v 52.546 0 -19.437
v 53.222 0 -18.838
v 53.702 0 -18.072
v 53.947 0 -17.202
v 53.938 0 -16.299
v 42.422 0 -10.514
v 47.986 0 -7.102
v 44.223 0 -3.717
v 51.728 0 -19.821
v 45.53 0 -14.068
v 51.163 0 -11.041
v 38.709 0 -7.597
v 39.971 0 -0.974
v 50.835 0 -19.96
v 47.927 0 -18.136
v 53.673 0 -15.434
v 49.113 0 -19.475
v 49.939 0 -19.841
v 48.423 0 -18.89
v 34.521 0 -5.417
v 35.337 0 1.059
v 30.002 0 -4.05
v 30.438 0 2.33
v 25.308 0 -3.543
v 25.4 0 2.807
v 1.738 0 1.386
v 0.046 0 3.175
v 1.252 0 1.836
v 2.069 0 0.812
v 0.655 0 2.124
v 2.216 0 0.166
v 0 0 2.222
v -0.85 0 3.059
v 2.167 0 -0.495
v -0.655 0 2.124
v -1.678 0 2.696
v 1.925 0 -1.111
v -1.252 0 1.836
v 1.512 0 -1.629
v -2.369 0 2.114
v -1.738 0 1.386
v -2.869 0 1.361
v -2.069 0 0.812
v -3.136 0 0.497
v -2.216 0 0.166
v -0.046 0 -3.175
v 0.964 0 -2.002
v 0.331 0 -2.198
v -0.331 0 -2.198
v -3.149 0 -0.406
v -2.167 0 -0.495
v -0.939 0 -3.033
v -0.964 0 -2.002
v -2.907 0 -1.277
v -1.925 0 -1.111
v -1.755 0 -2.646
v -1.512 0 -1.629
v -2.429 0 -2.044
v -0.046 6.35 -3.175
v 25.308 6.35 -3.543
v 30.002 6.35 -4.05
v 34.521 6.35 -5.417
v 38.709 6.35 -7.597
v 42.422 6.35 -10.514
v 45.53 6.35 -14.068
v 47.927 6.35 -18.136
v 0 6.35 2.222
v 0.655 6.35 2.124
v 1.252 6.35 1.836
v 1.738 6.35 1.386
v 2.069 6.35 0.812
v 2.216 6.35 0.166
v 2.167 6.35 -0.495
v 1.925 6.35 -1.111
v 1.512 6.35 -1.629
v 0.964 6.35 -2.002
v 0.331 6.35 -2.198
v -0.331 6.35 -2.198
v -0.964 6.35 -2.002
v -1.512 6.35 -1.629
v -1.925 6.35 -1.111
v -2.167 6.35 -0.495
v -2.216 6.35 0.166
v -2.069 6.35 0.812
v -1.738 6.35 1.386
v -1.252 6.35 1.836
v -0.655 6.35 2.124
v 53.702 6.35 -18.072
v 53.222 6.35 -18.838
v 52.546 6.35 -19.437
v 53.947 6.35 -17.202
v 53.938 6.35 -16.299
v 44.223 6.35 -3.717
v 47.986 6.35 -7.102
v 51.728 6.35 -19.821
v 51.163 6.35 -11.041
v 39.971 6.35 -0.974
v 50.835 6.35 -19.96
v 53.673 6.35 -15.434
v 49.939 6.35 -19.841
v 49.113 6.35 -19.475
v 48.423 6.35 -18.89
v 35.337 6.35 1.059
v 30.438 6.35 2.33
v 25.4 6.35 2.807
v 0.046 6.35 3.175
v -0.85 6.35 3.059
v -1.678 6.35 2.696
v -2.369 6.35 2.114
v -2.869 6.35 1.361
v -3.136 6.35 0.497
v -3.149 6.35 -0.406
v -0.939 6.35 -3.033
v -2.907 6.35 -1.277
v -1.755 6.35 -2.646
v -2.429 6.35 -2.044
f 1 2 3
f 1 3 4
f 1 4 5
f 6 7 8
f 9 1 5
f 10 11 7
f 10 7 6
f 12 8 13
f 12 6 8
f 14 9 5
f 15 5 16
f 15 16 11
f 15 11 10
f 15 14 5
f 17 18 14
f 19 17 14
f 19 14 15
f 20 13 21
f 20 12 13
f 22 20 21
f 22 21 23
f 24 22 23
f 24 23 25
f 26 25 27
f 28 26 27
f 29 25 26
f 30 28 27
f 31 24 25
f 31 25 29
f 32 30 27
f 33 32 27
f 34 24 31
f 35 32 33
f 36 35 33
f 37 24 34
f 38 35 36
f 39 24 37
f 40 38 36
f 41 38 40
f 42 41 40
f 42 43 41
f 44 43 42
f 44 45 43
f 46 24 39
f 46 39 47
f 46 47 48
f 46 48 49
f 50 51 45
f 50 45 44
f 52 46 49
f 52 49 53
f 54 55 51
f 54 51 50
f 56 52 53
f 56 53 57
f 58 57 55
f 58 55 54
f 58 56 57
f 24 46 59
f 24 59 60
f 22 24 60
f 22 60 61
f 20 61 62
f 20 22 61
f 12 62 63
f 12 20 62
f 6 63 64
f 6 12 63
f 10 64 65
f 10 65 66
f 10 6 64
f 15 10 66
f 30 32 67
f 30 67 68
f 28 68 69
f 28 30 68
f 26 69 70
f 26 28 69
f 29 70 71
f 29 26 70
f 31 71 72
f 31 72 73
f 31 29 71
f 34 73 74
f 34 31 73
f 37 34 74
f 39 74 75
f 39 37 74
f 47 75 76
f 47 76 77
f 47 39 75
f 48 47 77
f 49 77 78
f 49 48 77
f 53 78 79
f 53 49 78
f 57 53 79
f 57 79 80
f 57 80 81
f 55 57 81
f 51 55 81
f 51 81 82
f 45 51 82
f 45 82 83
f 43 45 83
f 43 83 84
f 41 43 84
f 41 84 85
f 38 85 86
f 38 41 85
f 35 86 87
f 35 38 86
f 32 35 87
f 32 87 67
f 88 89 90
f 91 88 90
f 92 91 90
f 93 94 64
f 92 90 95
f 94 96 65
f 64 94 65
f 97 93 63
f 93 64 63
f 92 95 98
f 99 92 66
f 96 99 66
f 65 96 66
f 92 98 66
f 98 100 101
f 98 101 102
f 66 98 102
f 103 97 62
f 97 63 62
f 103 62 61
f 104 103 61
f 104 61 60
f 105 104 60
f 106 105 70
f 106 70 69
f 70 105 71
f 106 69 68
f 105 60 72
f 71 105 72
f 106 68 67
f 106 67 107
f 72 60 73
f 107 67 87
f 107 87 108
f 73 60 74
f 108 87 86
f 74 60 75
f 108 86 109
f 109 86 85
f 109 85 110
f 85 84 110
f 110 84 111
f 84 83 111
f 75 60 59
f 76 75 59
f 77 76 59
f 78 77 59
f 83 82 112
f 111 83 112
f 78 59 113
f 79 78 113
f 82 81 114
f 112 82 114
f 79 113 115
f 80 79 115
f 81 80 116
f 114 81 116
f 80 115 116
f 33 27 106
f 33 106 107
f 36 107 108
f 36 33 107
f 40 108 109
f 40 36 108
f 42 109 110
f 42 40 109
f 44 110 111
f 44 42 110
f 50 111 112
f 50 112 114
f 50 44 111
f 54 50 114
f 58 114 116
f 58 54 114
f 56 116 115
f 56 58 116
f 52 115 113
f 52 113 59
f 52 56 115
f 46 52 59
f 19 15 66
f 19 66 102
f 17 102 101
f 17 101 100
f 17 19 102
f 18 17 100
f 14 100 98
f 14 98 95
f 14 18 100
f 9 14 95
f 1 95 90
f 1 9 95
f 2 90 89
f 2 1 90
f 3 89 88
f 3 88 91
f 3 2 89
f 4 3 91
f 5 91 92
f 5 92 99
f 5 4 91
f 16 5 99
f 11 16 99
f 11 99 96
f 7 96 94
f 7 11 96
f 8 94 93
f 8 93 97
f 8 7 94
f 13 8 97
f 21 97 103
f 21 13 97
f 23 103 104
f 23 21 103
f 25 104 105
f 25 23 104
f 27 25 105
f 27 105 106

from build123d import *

# Parameters (mm, degrees)
SKETCH1_R           = 2.2225
BOSS_EXTRUDE1_DEPTH = 6.35


with BuildPart() as part:
    # Sketch1 → Boss-Extrude1 (new body)
    with BuildSketch(Plane(origin=(0, 0, 0), x_dir=(1, 0, 0), z_dir=(0, 1, 0))):
        with BuildLine():
            Line((-0.046089406, 3.174665457), (25.307821187, 3.542750442))
            ThreePointArc((25.307821187, 3.542750442), (38.709203085, 7.5965874), (47.926567326, 18.135601931))
            ThreePointArc((47.926567326, 18.135601931), (52.150559021, 19.658475583), (53.673432674, 15.434483888))
            ThreePointArc((53.673432674, 15.434483888), (42.151727371, 2.260715725), (25.4, -2.806580473))
            Line((25.4, -2.806580473), (0.046089406, -3.174665457))
            ThreePointArc((0.046089406, -3.174665457), (-3.174665457, -0.046089406), (-0.046089406, 3.174665457))
        make_face()
        with Locations(Location((0, 0, 0), (0, 0, 270))):
            Circle(SKETCH1_R, mode=Mode.SUBTRACT)
    extrude(amount=BOSS_EXTRUDE1_DEPTH)


solid = part.part
